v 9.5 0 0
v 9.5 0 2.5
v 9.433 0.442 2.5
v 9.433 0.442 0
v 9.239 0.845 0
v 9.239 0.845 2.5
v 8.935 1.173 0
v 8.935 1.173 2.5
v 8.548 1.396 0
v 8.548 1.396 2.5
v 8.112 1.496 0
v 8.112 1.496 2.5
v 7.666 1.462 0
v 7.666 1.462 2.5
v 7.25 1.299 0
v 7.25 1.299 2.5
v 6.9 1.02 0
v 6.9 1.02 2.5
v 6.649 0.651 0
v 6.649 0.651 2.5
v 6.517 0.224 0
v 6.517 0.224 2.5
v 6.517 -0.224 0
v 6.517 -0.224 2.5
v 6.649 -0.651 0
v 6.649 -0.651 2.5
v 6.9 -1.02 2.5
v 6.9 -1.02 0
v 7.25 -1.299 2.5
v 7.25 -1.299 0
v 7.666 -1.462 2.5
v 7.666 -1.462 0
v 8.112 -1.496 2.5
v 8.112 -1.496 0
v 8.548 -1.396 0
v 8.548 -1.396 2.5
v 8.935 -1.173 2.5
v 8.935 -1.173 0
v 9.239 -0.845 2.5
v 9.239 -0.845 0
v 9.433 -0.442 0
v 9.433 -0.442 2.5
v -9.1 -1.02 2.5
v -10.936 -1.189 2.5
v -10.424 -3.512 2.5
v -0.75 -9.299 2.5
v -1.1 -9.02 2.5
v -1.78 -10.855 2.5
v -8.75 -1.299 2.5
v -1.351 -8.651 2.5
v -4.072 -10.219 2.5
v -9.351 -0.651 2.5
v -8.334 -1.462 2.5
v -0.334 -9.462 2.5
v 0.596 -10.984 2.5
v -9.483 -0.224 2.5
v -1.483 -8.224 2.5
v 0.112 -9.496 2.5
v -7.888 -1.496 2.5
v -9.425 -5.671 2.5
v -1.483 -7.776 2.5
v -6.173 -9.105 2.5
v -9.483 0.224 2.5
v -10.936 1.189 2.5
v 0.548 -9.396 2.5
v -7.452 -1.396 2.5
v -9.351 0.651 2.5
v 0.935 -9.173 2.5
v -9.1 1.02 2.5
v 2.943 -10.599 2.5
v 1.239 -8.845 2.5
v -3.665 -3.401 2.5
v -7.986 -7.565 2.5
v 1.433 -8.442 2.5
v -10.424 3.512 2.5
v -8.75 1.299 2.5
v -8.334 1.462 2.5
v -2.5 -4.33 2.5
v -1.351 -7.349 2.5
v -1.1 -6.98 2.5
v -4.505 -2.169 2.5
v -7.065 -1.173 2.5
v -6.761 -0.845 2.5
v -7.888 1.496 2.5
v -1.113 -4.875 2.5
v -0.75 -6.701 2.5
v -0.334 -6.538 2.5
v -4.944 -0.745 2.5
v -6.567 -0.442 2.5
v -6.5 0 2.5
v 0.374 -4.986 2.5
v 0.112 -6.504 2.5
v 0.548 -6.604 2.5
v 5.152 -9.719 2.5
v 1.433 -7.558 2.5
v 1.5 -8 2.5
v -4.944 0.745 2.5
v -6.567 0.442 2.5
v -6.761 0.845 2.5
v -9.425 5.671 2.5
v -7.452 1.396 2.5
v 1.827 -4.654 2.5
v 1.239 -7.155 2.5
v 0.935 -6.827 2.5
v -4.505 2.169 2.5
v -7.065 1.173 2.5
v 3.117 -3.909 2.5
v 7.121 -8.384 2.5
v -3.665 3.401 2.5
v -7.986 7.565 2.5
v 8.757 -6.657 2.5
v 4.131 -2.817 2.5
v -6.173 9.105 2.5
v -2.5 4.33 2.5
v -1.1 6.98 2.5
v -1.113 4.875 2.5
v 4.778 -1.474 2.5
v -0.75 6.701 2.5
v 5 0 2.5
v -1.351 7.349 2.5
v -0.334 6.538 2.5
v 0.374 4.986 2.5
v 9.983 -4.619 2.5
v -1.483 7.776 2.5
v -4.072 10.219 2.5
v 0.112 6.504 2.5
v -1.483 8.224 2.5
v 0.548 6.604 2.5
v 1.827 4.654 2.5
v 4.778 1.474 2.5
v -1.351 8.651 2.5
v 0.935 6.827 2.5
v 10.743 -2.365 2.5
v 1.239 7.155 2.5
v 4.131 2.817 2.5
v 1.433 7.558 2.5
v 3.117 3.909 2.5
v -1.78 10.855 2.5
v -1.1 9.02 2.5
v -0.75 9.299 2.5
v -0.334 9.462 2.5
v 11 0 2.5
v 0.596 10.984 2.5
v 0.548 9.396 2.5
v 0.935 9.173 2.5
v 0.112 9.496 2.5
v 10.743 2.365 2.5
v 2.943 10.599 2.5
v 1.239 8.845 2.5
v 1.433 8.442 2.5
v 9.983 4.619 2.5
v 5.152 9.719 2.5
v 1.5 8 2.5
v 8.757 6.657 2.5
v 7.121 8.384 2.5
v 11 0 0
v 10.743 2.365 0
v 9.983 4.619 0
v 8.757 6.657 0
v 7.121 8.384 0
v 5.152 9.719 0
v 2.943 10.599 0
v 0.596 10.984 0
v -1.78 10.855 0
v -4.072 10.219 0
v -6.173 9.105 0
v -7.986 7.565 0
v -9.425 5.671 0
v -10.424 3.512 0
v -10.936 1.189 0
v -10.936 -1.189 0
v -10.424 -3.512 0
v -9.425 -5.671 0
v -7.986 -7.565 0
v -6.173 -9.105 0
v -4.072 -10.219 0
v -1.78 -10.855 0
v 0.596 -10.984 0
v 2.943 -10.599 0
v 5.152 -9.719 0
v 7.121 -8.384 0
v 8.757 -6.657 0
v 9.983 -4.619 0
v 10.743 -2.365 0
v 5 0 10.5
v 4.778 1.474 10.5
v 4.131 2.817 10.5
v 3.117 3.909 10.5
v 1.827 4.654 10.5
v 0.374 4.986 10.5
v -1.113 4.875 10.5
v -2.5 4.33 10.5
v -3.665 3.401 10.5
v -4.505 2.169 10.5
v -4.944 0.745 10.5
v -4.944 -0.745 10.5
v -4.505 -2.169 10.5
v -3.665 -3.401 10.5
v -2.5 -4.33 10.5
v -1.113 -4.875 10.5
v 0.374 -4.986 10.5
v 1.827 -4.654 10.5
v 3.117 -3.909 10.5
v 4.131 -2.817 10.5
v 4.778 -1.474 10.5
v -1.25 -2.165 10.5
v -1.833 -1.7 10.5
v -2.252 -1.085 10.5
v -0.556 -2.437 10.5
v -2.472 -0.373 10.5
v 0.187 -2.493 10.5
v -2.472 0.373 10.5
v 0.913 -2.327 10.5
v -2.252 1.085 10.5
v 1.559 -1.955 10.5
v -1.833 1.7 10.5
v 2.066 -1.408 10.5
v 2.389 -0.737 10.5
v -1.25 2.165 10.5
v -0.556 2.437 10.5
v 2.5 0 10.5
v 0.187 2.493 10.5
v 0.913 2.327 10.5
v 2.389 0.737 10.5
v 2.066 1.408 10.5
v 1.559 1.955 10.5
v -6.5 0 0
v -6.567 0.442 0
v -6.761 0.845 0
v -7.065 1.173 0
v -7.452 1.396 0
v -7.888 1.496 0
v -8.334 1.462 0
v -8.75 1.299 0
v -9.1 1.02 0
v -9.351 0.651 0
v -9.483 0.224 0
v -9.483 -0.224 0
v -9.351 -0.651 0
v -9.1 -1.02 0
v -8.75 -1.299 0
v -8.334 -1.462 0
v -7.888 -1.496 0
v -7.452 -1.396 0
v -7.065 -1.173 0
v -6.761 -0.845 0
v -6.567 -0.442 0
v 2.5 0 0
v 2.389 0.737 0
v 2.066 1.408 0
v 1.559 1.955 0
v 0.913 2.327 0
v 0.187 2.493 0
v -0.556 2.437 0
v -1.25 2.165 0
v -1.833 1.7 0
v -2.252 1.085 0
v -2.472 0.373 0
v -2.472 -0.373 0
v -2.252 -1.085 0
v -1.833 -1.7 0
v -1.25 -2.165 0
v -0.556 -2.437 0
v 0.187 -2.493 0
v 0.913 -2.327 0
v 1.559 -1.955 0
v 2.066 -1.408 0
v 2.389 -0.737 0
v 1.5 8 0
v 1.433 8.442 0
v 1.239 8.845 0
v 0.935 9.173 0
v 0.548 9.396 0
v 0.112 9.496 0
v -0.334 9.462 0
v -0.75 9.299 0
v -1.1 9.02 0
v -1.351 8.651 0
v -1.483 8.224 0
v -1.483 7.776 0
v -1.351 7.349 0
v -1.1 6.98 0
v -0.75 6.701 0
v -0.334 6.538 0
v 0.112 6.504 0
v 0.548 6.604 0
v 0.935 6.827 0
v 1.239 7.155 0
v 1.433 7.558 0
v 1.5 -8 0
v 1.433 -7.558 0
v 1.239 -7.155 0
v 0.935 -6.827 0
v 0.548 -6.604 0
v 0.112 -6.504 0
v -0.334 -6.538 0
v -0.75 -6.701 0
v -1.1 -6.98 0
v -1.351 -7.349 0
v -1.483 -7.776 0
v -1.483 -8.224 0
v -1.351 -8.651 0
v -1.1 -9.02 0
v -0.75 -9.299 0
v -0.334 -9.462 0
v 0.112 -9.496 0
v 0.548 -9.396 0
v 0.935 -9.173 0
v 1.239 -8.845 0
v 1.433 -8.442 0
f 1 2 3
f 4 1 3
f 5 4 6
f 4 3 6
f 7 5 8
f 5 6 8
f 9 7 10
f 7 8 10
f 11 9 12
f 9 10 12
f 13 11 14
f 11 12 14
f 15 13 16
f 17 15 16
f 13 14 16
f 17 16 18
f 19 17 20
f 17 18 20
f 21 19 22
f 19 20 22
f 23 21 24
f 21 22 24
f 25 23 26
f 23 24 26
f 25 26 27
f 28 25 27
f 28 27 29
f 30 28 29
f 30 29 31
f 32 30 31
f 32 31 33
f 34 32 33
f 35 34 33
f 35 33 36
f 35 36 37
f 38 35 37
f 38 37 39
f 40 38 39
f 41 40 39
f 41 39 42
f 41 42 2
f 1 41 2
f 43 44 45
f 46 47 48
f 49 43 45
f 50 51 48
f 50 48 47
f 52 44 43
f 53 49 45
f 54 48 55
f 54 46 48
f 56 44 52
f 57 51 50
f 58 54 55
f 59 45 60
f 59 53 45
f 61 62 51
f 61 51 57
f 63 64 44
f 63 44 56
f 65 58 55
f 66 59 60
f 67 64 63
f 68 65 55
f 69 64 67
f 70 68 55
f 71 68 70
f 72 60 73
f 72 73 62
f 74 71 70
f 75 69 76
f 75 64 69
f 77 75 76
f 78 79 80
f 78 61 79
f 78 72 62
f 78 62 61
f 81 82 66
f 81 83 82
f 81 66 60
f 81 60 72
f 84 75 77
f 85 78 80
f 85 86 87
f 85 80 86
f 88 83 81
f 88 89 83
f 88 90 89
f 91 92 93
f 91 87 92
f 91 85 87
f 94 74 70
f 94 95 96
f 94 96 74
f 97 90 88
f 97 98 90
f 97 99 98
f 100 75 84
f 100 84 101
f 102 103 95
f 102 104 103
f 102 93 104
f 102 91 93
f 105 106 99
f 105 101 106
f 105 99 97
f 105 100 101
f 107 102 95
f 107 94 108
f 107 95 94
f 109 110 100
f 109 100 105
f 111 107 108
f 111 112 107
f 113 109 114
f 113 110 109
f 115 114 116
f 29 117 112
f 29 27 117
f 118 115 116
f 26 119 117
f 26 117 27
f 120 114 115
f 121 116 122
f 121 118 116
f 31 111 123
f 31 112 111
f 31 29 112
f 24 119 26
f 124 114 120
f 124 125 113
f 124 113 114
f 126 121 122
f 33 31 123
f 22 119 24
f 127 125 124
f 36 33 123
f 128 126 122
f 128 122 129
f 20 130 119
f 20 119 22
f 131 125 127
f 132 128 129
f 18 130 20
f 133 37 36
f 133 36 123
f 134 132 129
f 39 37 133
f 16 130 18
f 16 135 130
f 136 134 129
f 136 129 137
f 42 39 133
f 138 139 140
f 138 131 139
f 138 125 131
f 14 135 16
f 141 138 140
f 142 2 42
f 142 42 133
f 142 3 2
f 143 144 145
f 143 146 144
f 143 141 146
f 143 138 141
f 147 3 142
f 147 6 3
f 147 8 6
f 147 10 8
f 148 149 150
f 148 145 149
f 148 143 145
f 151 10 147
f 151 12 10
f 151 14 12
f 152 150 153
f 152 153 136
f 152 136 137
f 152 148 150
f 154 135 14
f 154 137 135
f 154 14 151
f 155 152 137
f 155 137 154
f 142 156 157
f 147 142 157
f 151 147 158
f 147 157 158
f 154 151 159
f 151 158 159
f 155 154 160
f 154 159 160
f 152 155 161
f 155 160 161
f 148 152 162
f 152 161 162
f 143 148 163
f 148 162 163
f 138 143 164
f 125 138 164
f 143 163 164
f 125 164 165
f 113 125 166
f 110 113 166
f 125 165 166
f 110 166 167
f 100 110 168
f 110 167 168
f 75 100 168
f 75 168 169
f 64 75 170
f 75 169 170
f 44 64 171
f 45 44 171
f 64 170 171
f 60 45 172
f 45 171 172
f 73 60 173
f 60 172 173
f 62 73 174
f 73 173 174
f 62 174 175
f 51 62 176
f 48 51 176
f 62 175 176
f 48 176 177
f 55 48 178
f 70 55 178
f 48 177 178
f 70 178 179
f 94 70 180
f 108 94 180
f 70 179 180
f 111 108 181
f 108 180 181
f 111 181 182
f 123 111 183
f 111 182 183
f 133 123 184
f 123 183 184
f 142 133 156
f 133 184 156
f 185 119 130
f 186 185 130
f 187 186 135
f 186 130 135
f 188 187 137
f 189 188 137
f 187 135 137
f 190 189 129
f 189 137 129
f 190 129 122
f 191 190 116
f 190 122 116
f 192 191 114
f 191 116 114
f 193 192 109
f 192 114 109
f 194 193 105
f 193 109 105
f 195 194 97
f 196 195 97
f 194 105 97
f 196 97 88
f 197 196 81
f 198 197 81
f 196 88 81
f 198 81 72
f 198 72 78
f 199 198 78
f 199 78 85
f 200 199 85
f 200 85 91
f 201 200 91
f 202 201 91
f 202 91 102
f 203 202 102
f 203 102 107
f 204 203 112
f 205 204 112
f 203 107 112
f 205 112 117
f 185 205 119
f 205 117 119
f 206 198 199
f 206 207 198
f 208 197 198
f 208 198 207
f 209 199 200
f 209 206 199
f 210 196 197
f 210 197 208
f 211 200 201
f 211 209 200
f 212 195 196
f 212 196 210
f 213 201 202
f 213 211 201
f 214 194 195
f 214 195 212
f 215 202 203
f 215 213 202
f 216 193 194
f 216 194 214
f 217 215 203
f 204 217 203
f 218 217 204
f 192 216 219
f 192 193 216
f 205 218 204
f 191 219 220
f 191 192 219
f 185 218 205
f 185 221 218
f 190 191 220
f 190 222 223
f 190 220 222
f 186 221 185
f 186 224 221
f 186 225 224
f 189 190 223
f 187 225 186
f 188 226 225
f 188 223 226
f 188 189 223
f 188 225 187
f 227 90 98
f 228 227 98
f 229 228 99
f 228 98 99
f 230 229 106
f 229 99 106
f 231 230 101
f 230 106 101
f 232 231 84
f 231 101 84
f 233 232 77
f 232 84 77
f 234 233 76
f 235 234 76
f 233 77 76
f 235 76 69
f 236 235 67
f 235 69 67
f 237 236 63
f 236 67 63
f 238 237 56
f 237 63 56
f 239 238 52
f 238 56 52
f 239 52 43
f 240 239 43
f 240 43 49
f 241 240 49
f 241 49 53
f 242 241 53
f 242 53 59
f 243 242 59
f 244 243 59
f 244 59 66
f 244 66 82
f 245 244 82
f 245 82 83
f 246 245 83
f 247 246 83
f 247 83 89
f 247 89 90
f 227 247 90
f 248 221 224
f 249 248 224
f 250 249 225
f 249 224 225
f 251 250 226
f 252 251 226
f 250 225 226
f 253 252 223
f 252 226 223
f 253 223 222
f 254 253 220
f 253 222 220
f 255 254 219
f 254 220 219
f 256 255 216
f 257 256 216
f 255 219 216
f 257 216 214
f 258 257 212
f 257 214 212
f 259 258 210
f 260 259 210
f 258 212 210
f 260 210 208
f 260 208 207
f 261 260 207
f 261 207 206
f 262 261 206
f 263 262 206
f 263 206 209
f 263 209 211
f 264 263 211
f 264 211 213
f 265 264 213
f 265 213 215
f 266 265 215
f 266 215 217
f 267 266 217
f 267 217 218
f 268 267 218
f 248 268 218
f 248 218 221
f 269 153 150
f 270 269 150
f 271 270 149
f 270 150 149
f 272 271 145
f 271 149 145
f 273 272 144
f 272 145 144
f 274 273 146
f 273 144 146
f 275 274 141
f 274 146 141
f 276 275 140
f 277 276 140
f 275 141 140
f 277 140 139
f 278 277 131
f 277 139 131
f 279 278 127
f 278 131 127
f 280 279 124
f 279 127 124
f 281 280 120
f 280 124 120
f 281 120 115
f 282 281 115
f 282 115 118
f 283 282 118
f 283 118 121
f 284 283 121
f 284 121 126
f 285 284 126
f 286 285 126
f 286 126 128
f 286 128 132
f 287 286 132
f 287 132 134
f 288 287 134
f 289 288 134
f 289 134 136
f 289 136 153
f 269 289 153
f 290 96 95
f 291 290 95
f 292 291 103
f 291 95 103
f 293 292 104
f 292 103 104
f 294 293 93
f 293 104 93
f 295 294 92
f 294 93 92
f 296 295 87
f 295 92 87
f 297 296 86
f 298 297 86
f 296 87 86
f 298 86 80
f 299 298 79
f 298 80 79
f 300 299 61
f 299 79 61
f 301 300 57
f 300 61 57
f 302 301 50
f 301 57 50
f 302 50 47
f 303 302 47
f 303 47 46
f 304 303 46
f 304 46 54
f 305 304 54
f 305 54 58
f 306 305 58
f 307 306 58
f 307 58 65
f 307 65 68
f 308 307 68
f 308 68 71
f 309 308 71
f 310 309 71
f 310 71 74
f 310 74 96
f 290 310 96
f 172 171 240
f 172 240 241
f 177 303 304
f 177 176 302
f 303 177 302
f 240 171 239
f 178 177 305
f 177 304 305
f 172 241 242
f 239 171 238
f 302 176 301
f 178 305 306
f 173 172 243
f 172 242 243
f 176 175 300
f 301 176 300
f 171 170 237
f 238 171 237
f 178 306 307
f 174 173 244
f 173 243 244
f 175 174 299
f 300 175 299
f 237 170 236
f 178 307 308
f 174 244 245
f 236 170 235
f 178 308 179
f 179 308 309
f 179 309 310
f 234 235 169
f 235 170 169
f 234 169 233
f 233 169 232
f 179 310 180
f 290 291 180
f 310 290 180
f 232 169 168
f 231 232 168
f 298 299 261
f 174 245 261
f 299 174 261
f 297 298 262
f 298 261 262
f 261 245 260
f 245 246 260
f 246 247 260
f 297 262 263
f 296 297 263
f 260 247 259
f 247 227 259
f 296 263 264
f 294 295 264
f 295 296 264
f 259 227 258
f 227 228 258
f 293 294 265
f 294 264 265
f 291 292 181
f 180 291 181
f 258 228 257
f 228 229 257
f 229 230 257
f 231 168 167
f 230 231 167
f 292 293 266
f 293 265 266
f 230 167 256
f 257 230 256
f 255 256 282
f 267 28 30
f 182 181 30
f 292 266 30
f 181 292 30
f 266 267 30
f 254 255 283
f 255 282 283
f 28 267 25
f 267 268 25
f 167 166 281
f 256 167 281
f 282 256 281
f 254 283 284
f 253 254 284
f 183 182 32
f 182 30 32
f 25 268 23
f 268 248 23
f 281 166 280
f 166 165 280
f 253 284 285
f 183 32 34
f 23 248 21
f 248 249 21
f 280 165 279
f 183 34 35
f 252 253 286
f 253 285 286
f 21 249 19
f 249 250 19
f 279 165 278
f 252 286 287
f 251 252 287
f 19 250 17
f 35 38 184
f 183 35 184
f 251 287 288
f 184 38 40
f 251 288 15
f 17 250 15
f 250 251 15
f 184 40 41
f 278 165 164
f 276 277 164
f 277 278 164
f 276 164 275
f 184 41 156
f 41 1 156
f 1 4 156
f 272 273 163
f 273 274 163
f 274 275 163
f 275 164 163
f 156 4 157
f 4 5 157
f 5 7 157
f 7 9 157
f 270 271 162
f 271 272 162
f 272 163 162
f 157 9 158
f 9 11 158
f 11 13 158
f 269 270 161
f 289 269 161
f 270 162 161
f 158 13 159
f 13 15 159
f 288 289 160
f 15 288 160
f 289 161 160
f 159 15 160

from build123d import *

# Parameters (mm, degrees)
SKETCH_1_R          = 11
EXTRUDE_1_DEPTH     = 2.5
SKETCH_2_R          = 5
EXTRUDE_2_DEPTH     = 8
CUT_EXTRUDE_1_REACH = 20.768
SKETCH_3_R          = 2.5
CUT_EXTRUDE_2_REACH = 19.493
SKETCH_4_R          = 1.5


with BuildPart() as part:
    # 草图1 → 凸台-拉伸1 (new body)
    with BuildSketch(Plane.XY):
        Circle(SKETCH_1_R)
    extrude(amount=EXTRUDE_1_DEPTH)

    # 草图2 → 凸台-拉伸2 (add)
    with BuildSketch(Plane.XY.offset(2.5)):
        Circle(SKETCH_2_R)
    extrude(amount=EXTRUDE_2_DEPTH)

    # 草图3 → 切除-拉伸1 (cut, up to next)
    with BuildSketch(Plane.XY.offset(10.5), mode=Mode.PRIVATE) as cut_extrude_1_sk1:
        Circle(SKETCH_3_R)
    cut_extrude_1_tool1 = extrude(cut_extrude_1_sk1.sketch, amount=-CUT_EXTRUDE_1_REACH, mode=Mode.PRIVATE) & part.part
    add(cut_extrude_1_tool1.solids().sort_by_distance((0, 0, 10.5))[0], mode=Mode.SUBTRACT)

    # 草图4 → 切除-拉伸2 (cut, up to next)
    with BuildSketch(Plane.XY.offset(2.5), mode=Mode.PRIVATE) as cut_extrude_2_sk1:
        with Locations((8, 0)):
            Circle(SKETCH_4_R)
    cut_extrude_2_tool1 = extrude(cut_extrude_2_sk1.sketch, amount=-CUT_EXTRUDE_2_REACH, mode=Mode.PRIVATE) & part.part
    # 草图4 → 切除-拉伸2 (cut, up to next)
    with BuildSketch(Plane.XY.offset(2.5), mode=Mode.PRIVATE) as cut_extrude_2_sk2:
        with Locations((0, -8)):
            Circle(SKETCH_4_R)
    cut_extrude_2_tool2 = extrude(cut_extrude_2_sk2.sketch, amount=-CUT_EXTRUDE_2_REACH, mode=Mode.PRIVATE) & part.part
    # 草图4 → 切除-拉伸2 (cut, up to next)
    with BuildSketch(Plane.XY.offset(2.5), mode=Mode.PRIVATE) as cut_extrude_2_sk3:
        with Locations((-8, 0)):
            Circle(SKETCH_4_R)
    cut_extrude_2_tool3 = extrude(cut_extrude_2_sk3.sketch, amount=-CUT_EXTRUDE_2_REACH, mode=Mode.PRIVATE) & part.part
    # 草图4 → 切除-拉伸2 (cut, up to next)
    with BuildSketch(Plane.XY.offset(2.5), mode=Mode.PRIVATE) as cut_extrude_2_sk4:
        with Locations((0, 8)):
            Circle(SKETCH_4_R)
    cut_extrude_2_tool4 = extrude(cut_extrude_2_sk4.sketch, amount=-CUT_EXTRUDE_2_REACH, mode=Mode.PRIVATE) & part.part
    add(cut_extrude_2_tool1.solids().sort_by_distance((8, 0, 2.5))[0], mode=Mode.SUBTRACT)
    add(cut_extrude_2_tool2.solids().sort_by_distance((0, -8, 2.5))[0], mode=Mode.SUBTRACT)
    add(cut_extrude_2_tool3.solids().sort_by_distance((-8, 0, 2.5))[0], mode=Mode.SUBTRACT)
    add(cut_extrude_2_tool4.solids().sort_by_distance((0, 8, 2.5))[0], mode=Mode.SUBTRACT)


solid = part.part
